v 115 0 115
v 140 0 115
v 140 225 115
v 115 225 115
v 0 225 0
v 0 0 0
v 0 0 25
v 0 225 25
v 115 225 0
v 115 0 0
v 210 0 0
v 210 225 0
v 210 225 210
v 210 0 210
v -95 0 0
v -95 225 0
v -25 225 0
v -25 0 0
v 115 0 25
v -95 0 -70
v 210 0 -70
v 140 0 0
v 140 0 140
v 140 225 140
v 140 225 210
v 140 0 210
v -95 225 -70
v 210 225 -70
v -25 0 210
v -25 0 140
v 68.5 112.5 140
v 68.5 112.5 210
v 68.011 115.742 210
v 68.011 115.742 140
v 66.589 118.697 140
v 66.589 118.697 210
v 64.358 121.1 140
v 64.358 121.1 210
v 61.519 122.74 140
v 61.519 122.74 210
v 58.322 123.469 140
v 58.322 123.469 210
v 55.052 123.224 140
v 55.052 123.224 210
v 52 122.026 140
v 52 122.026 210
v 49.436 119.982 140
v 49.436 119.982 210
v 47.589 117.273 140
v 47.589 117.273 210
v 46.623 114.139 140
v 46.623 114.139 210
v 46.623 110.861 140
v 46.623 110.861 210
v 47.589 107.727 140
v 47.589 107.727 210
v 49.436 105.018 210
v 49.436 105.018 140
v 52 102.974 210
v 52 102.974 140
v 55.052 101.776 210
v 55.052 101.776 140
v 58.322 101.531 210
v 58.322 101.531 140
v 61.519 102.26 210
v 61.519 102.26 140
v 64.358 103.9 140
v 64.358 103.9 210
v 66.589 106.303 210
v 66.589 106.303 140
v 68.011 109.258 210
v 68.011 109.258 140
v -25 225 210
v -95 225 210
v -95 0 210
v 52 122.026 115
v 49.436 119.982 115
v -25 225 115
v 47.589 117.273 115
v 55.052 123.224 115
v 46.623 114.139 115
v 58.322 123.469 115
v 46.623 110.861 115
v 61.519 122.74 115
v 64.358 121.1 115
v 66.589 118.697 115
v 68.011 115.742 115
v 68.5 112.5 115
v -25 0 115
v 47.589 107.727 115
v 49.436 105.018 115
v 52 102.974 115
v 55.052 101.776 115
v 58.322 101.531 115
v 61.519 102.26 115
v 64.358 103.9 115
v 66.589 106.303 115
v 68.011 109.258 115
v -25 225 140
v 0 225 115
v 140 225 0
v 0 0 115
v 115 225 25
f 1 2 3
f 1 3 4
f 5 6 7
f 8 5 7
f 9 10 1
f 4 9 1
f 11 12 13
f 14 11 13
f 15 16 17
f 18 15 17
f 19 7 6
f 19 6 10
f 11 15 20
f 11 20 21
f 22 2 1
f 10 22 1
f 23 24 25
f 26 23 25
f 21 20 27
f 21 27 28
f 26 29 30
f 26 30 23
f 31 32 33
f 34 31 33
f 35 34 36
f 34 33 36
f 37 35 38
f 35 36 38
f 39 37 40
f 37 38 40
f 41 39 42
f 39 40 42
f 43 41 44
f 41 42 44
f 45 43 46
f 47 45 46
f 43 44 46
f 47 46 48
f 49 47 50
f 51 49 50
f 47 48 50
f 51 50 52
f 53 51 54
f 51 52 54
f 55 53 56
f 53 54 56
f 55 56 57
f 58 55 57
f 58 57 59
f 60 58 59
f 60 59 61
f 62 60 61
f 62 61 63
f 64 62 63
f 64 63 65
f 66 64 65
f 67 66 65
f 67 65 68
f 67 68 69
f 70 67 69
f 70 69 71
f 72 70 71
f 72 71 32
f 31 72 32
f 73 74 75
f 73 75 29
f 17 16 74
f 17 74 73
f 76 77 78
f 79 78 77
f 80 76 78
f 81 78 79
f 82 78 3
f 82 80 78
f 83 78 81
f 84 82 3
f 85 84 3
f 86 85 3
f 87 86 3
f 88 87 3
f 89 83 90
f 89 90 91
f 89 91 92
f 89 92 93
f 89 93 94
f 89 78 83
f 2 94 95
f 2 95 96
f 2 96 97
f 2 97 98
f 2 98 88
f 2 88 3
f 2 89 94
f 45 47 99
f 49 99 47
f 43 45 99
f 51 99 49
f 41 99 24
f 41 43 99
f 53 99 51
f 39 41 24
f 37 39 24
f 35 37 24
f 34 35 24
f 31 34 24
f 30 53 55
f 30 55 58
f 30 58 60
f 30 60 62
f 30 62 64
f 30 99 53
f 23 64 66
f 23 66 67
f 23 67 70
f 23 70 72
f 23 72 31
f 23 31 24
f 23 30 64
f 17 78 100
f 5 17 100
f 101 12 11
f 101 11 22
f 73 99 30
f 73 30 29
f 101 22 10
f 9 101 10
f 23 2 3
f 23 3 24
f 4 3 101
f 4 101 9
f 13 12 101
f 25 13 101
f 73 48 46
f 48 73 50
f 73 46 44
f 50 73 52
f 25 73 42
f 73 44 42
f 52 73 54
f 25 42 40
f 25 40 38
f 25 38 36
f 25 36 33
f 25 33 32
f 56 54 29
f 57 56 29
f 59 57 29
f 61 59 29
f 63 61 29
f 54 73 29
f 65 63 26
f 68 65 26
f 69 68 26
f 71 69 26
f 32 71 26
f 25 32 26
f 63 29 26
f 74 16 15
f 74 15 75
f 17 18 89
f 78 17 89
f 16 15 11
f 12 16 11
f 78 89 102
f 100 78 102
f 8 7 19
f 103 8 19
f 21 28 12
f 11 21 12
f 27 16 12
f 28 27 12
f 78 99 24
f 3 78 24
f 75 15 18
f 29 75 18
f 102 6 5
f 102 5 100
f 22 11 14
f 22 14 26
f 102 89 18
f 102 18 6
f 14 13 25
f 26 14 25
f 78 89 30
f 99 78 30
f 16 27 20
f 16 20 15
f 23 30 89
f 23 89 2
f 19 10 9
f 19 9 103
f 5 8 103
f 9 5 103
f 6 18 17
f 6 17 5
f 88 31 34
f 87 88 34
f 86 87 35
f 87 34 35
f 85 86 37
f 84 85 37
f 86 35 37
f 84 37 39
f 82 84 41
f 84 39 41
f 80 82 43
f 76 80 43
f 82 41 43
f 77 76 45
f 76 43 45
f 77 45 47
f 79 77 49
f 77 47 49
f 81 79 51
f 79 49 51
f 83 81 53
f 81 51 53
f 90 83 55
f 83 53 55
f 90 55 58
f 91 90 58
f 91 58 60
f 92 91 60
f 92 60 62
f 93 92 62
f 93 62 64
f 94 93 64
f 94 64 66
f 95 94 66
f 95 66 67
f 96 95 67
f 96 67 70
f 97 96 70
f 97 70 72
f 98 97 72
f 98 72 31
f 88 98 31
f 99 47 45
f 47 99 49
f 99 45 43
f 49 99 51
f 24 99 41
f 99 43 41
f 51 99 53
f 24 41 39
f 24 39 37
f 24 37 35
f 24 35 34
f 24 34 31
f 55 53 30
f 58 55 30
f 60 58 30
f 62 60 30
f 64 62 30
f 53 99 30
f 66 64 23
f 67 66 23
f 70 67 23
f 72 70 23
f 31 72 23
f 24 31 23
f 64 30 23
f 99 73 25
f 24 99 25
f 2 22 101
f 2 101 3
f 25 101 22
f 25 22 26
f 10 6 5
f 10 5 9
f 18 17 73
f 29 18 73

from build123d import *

# Parameters (mm, degrees)
F0_W      = 115
F0_H      = 25
F1_DEPTH  = 225
F2_W      = 25
F2_H      = 115
F3_DEPTH  = 225
F6_W      = 165
F6_H      = 25
F7_DEPTH  = 225
F8_W      = 305
F8_H      = 70
F9_DEPTH  = 225
F10_W     = 70
F10_H     = 210
F11_DEPTH = 225
F13_W     = 165
F13_H     = 70
F14_DEPTH = 225
F15_R     = 11
F16_DEPTH = 95


with BuildPart() as f1:
    # F0 (on Front) → F1 (new body)
    with BuildSketch(Plane.XZ):
        with Locations((57.5, 12.5)):
            Rectangle(F0_W, F0_H)
    extrude(amount=-F1_DEPTH)


with BuildPart() as f3:
    # F2 (on Front) → F3 (new body, through all)
    with BuildSketch(Plane.XZ):
        with Locations((-12.5, 57.5)):
            Rectangle(F2_W, F2_H)
    extrude(amount=-F3_DEPTH)


with BuildPart() as f5_1:
    # F5: instance of F3
    add(f3.part.mirror(Plane(origin=(57.5, 112.5, 12.5), x_dir=(0, 1, 0), z_dir=(1, 0, 0))))


with BuildPart() as f7:
    # F6 (on Front) → F7 (new body, through all)
    with BuildSketch(Plane.XZ):
        with Locations((57.5, 127.5)):
            Rectangle(F6_W, F6_H)
    extrude(amount=-F7_DEPTH)


with BuildPart() as f9:
    # F8 (on Front) → F9 (new body, through all)
    with BuildSketch(Plane.XZ):
        with Locations((57.5, -35)):
            Rectangle(F8_W, F8_H)
    extrude(amount=-F9_DEPTH)


with BuildPart() as f11:
    # F10 (on Front) → F11 (new body, through all)
    with BuildSketch(Plane.XZ):
        with Locations((-60, 105)):
            Rectangle(F10_W, F10_H)
    extrude(amount=-F11_DEPTH)


with BuildPart() as f12_1:
    # F12: instance of F11
    add(f11.part.mirror(Plane(origin=(57.5, 112.5, 12.5), x_dir=(0, 1, 0), z_dir=(1, 0, 0))))


with BuildPart() as f14:
    # F13 (on Front) → F14 (new body, through all)
    with BuildSketch(Plane.XZ):
        with Locations((57.5, 175)):
            Rectangle(F13_W, F13_H)
    extrude(amount=-F14_DEPTH)


with BuildPart() as f16_tool:
    # F15 (on face) → F16 (new body, through all)
    with BuildSketch(Plane.XY.offset(210)):
        with Locations((57.5, 112.5)):
            Circle(F15_R)
    extrude(amount=-F16_DEPTH)


with BuildPart() as f7_1:
    add(f7.part)

    # F16: cut by f16_tool
    add(f16_tool.part, mode=Mode.SUBTRACT)


with BuildPart() as f14_1:
    add(f14.part)

    # F16: cut by f16_tool
    add(f16_tool.part, mode=Mode.SUBTRACT)


solid = Compound([f1.part, f3.part, f5_1.part, f9.part, f11.part, f12_1.part, f7_1.part, f14_1.part])
